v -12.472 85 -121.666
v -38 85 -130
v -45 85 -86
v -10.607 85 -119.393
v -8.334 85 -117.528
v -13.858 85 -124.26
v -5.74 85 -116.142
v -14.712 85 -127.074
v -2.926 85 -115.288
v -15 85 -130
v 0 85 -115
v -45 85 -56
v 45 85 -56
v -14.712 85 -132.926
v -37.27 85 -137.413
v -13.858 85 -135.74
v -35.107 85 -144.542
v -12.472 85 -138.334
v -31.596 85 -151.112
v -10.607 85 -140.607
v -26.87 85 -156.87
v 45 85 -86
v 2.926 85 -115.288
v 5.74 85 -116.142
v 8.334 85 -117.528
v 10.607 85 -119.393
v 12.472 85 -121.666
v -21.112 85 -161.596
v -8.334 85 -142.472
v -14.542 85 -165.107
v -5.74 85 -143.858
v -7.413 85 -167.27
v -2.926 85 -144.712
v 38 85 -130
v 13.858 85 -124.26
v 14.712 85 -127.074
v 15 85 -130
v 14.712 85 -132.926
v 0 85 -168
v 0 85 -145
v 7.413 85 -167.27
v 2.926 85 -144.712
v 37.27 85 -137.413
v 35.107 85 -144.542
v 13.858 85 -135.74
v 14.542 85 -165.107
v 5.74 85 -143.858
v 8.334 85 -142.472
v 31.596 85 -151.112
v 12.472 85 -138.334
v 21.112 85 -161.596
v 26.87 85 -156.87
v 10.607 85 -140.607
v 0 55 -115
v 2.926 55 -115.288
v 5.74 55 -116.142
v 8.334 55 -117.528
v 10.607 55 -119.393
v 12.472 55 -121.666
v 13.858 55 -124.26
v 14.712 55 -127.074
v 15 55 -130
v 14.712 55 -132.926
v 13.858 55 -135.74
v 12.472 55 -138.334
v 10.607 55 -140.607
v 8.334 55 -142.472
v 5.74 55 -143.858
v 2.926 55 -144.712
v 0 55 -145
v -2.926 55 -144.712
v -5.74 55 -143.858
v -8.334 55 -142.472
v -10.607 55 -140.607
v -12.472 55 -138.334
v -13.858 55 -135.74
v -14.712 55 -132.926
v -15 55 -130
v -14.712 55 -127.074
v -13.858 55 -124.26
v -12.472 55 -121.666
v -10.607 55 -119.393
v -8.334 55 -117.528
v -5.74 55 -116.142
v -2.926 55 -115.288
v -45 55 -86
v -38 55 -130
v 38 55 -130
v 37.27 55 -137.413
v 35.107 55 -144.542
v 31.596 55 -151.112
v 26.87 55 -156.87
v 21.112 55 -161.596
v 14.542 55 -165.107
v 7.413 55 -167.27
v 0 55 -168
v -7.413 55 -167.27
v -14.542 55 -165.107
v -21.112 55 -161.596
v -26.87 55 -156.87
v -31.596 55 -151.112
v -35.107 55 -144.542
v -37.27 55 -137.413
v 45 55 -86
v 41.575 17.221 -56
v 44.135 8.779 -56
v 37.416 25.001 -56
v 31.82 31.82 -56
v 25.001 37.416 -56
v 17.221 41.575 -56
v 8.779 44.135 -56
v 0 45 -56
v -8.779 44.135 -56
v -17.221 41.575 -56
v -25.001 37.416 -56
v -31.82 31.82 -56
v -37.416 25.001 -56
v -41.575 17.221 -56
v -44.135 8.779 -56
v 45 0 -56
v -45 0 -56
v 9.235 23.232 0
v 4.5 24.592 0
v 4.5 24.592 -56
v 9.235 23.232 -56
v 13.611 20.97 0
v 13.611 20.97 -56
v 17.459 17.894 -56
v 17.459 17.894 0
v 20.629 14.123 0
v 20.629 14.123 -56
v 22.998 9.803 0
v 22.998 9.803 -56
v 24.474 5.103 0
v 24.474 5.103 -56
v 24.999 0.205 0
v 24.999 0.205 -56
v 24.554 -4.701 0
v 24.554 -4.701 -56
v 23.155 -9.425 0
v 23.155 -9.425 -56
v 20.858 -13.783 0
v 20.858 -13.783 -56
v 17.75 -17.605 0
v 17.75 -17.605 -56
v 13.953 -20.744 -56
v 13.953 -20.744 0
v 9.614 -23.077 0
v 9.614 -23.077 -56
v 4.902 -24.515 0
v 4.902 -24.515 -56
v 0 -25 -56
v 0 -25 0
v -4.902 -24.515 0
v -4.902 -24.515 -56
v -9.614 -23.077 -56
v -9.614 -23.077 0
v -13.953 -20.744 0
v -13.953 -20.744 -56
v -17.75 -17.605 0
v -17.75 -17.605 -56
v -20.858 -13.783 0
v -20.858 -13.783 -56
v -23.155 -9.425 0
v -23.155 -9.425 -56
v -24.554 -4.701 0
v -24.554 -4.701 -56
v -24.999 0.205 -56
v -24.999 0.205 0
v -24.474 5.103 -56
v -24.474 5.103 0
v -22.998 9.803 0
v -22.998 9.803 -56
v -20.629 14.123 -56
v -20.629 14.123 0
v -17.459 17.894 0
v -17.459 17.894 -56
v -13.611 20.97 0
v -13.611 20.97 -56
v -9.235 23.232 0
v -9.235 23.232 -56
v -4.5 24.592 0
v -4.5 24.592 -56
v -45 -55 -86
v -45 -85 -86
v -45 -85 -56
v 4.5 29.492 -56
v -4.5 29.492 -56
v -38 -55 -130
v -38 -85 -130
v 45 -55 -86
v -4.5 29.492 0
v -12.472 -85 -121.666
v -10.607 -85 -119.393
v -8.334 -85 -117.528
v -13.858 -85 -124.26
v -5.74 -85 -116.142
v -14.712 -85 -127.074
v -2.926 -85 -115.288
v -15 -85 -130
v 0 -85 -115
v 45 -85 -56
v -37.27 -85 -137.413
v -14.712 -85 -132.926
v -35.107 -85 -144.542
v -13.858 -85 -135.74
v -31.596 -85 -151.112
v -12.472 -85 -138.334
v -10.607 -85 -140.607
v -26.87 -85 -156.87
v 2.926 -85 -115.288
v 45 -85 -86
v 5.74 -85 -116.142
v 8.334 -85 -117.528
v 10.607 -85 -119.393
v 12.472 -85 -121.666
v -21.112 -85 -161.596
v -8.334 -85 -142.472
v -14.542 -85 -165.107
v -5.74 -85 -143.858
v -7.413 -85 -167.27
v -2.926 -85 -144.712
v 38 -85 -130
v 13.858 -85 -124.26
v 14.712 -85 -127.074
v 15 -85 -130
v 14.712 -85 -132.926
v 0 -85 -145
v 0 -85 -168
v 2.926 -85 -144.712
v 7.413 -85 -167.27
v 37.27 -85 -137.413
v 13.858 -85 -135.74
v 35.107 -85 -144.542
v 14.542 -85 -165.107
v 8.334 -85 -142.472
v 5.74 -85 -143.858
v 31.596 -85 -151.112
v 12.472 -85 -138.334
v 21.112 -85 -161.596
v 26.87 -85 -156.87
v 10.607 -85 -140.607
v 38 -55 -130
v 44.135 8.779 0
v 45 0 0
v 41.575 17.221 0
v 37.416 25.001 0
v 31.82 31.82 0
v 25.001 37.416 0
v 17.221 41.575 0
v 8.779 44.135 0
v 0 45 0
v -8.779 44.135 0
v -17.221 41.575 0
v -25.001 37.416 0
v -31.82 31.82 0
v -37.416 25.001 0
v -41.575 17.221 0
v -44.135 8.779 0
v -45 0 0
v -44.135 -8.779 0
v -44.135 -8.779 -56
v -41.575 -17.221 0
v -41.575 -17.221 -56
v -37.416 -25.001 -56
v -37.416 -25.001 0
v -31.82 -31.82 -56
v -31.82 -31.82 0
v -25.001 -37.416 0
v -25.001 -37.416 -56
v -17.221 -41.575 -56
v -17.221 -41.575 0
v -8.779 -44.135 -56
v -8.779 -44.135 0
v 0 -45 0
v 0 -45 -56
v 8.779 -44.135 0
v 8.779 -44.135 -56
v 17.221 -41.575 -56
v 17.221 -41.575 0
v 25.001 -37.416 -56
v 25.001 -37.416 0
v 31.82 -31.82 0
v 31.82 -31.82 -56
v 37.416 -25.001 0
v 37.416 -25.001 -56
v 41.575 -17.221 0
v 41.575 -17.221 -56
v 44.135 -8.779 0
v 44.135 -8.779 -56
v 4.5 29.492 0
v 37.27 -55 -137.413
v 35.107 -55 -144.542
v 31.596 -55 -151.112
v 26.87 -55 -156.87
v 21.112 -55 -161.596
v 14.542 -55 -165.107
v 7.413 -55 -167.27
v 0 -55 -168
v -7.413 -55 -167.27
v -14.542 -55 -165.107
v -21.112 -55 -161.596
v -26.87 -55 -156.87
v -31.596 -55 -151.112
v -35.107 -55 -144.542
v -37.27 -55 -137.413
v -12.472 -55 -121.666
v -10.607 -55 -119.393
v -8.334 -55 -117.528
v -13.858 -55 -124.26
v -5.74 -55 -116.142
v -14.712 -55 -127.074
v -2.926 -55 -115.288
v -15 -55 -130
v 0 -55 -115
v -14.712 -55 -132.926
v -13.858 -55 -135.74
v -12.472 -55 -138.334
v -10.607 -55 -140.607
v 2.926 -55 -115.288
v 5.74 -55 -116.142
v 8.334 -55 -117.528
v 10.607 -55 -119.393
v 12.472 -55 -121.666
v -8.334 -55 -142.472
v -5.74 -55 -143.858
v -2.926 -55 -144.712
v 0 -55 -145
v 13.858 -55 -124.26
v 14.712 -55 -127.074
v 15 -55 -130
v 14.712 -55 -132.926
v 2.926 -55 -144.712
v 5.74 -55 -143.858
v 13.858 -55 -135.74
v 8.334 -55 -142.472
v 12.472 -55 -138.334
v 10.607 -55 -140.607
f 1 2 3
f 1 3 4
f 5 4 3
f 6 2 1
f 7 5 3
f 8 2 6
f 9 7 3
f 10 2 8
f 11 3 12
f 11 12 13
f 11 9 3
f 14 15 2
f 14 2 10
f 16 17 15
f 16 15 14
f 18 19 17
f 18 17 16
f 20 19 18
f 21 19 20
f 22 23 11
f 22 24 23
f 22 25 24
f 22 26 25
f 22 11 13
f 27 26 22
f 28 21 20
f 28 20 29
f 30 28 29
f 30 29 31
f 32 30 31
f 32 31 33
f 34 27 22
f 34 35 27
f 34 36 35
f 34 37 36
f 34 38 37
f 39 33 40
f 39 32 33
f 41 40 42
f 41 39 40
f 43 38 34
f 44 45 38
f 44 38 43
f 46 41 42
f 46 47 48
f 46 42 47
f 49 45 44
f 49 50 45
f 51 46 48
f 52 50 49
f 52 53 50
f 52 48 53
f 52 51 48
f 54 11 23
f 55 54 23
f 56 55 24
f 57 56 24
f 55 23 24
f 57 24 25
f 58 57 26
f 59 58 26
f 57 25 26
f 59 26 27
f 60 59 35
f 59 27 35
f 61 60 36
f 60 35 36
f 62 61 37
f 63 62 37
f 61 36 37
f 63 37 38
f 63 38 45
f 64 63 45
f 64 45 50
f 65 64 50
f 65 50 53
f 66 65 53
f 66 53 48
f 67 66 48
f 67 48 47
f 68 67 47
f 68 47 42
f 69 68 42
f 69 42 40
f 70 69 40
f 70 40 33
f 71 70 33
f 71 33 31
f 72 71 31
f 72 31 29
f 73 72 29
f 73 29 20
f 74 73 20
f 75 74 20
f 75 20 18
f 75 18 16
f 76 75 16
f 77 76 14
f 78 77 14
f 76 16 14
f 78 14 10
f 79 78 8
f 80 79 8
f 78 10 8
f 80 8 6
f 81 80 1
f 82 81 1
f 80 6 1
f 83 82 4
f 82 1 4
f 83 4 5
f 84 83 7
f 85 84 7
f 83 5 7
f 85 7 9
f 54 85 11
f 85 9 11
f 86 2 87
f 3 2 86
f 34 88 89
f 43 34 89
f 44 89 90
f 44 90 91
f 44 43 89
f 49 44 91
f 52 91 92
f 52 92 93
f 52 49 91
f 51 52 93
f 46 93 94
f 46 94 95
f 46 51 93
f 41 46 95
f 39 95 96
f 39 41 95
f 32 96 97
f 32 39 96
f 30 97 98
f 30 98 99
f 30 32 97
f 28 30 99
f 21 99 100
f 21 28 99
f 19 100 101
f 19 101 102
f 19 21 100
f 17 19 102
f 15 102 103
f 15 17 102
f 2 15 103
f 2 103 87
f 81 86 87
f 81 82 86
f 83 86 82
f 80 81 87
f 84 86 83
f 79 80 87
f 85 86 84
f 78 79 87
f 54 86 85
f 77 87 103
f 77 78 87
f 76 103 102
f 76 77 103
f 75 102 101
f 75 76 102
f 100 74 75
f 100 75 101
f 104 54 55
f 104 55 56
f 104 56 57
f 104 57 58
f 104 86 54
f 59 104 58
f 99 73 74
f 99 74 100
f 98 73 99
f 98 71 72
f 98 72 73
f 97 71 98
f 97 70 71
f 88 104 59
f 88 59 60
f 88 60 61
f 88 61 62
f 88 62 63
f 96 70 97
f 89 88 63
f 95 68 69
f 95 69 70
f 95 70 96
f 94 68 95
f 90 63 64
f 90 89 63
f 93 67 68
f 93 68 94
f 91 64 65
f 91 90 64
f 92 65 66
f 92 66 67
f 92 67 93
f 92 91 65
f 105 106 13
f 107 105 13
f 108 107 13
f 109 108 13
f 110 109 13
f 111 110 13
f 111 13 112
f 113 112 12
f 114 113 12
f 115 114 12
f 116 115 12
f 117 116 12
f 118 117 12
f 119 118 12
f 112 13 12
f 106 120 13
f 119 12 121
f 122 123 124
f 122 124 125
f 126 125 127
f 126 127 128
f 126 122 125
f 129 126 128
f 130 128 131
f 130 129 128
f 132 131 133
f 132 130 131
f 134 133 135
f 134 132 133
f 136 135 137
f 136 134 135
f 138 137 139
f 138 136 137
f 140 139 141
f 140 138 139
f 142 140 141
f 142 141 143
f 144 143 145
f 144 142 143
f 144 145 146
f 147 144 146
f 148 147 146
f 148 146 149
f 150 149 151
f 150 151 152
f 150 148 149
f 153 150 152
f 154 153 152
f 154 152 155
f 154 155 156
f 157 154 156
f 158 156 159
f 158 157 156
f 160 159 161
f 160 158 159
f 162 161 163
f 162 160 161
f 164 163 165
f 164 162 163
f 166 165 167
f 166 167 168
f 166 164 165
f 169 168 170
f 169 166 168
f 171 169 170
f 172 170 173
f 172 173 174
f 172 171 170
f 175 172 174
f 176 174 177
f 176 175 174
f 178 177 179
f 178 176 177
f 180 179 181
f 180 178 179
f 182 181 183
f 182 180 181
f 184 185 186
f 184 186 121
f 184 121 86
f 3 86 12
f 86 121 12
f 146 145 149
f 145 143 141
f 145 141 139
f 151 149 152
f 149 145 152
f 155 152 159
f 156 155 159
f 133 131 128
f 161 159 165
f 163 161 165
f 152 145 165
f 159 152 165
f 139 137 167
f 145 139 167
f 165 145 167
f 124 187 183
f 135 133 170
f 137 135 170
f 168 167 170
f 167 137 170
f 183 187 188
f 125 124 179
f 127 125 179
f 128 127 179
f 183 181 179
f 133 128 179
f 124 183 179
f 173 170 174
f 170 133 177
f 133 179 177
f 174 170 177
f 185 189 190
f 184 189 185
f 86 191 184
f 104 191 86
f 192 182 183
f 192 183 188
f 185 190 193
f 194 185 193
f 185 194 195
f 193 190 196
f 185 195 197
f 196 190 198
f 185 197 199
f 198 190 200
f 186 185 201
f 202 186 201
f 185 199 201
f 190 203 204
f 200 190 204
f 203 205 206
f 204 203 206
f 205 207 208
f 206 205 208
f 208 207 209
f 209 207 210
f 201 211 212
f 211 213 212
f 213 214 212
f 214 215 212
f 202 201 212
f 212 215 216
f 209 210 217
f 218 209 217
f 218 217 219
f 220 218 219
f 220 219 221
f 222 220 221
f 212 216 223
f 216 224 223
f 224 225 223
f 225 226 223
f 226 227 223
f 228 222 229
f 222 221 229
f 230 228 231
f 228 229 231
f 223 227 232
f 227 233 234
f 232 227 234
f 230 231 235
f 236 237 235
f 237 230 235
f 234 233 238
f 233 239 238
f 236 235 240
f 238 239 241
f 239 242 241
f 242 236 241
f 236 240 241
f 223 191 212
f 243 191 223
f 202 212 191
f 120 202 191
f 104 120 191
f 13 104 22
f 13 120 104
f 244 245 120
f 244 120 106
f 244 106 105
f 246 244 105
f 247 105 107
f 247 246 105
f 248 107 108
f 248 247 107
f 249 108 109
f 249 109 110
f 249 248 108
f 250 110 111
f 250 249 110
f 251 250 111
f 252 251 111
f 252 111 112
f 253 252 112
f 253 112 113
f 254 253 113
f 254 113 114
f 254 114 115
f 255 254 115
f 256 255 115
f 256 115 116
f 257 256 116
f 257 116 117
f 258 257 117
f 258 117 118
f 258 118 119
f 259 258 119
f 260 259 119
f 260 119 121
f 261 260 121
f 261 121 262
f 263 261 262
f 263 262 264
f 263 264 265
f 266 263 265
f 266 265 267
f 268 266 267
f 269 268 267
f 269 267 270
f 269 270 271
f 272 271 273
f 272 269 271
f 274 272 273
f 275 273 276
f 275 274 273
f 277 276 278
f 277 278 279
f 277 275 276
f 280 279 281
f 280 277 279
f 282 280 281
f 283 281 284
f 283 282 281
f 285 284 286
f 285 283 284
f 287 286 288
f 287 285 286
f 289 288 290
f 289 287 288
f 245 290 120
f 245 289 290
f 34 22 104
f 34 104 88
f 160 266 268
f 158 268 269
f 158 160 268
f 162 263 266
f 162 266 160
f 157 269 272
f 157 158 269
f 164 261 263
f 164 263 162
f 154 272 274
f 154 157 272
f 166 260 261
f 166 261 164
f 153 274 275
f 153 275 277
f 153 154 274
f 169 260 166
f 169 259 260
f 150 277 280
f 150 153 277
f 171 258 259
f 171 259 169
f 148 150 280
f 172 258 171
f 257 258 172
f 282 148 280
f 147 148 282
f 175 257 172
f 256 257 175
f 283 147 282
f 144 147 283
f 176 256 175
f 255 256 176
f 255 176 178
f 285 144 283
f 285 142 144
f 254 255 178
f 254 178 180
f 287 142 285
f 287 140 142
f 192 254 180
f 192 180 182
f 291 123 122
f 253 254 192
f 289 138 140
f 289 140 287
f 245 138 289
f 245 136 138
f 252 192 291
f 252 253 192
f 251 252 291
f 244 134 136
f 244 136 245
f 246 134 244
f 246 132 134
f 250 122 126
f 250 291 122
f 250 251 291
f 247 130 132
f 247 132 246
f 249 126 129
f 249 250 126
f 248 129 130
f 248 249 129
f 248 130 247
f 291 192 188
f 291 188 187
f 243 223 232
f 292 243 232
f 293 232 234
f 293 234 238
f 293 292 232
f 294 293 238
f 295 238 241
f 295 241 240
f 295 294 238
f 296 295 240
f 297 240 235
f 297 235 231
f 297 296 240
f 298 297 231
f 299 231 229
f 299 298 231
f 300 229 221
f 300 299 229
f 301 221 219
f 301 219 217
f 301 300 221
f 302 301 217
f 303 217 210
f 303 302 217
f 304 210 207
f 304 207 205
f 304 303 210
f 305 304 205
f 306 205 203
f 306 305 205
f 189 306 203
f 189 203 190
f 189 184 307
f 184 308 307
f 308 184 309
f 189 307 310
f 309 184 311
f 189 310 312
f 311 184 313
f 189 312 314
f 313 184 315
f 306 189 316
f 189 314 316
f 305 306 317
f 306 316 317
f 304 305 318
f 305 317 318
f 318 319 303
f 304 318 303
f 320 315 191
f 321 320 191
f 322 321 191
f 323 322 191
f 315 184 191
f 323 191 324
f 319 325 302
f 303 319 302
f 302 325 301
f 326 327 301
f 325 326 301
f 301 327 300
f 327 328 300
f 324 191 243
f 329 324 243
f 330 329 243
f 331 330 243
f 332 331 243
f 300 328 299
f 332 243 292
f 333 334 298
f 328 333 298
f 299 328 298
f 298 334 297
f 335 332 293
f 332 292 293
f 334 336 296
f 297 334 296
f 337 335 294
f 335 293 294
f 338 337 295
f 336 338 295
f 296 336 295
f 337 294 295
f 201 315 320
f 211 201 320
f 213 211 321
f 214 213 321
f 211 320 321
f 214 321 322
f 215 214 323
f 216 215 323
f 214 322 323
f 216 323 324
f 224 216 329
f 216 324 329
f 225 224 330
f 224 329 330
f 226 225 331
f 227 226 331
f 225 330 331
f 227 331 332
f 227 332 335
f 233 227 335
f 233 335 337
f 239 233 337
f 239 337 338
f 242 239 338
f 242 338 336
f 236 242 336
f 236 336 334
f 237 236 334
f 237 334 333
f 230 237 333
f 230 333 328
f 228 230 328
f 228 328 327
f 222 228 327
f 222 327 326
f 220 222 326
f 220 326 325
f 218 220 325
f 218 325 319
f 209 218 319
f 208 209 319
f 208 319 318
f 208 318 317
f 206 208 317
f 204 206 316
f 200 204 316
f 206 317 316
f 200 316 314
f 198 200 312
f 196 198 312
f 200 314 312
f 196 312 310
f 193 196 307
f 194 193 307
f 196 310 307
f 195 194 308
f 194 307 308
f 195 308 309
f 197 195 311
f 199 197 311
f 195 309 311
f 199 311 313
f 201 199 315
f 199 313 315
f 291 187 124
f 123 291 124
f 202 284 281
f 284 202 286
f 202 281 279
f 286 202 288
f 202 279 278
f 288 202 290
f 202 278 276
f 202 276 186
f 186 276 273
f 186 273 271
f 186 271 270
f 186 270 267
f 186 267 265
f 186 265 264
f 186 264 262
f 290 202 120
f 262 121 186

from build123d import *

# Parameters (mm, degrees)
SKETCH2_R           = 45
BOSS_EXTRUDE3_DEPTH = 56
SKETCH4_W           = 90
SKETCH4_H           = 170
BOSS_EXTRUDE4_DEPTH = 30
SKETCH6_R           = 15
BOSS_EXTRUDE5_DEPTH = 170
SKETCH11_W          = 132.381260595
SKETCH11_H          = 110
CUT_EXTRUDE3_DEPTH  = 130


with BuildPart() as part:
    # Sketch2 → Boss-Extrude3 (new body)
    with BuildSketch(Plane.XY):
        Circle(SKETCH2_R)
        with BuildLine():
            Line((-4.5, 29.491665255), (4.5, 29.491665255))
            Line((4.5, 29.491665255), (4.5, 24.591665255))
            ThreePointArc((4.5, 24.591665255), (0, -25), (-4.5, 24.591665255))
            Line((-4.5, 24.591665255), (-4.5, 29.491665255))
        make_face(mode=Mode.SUBTRACT)
    extrude(amount=-BOSS_EXTRUDE3_DEPTH)

    # Sketch4 → Boss-Extrude4 (add)
    with BuildSketch(Plane(origin=(0, 0, -56), x_dir=(-1, 0, 0), z_dir=(0, 0, -1))):
        Rectangle(SKETCH4_W, SKETCH4_H)
    extrude(amount=BOSS_EXTRUDE4_DEPTH)

    # Sketch6 → Boss-Extrude5 (add)
    with BuildSketch(Plane(origin=(0, 85, 0), x_dir=(1, 0, 0), z_dir=(0, 1, 0))):
        with BuildLine():
            Line((45, 86), (38, 130))
            ThreePointArc((38, 130), (0, 168), (-38, 130))
            Line((-38, 130), (-45, 86))
            Line((-45, 86), (45, 86))
        make_face()
        with Locations(Location((0, 130, 0), (0, 0, 270))):
            Circle(SKETCH6_R, mode=Mode.SUBTRACT)
    extrude(amount=-BOSS_EXTRUDE5_DEPTH)

    # Sketch11 → Cut-Extrude3 (cut, symmetric)
    with BuildSketch(Plane(origin=(0, 0, 0), x_dir=(0, 0, -1), z_dir=(1, 0, 0))):
        with Locations((152.190630298, 0)):
            Rectangle(SKETCH11_W, SKETCH11_H)
    extrude(amount=CUT_EXTRUDE3_DEPTH, both=True, mode=Mode.SUBTRACT)


solid = part.part
